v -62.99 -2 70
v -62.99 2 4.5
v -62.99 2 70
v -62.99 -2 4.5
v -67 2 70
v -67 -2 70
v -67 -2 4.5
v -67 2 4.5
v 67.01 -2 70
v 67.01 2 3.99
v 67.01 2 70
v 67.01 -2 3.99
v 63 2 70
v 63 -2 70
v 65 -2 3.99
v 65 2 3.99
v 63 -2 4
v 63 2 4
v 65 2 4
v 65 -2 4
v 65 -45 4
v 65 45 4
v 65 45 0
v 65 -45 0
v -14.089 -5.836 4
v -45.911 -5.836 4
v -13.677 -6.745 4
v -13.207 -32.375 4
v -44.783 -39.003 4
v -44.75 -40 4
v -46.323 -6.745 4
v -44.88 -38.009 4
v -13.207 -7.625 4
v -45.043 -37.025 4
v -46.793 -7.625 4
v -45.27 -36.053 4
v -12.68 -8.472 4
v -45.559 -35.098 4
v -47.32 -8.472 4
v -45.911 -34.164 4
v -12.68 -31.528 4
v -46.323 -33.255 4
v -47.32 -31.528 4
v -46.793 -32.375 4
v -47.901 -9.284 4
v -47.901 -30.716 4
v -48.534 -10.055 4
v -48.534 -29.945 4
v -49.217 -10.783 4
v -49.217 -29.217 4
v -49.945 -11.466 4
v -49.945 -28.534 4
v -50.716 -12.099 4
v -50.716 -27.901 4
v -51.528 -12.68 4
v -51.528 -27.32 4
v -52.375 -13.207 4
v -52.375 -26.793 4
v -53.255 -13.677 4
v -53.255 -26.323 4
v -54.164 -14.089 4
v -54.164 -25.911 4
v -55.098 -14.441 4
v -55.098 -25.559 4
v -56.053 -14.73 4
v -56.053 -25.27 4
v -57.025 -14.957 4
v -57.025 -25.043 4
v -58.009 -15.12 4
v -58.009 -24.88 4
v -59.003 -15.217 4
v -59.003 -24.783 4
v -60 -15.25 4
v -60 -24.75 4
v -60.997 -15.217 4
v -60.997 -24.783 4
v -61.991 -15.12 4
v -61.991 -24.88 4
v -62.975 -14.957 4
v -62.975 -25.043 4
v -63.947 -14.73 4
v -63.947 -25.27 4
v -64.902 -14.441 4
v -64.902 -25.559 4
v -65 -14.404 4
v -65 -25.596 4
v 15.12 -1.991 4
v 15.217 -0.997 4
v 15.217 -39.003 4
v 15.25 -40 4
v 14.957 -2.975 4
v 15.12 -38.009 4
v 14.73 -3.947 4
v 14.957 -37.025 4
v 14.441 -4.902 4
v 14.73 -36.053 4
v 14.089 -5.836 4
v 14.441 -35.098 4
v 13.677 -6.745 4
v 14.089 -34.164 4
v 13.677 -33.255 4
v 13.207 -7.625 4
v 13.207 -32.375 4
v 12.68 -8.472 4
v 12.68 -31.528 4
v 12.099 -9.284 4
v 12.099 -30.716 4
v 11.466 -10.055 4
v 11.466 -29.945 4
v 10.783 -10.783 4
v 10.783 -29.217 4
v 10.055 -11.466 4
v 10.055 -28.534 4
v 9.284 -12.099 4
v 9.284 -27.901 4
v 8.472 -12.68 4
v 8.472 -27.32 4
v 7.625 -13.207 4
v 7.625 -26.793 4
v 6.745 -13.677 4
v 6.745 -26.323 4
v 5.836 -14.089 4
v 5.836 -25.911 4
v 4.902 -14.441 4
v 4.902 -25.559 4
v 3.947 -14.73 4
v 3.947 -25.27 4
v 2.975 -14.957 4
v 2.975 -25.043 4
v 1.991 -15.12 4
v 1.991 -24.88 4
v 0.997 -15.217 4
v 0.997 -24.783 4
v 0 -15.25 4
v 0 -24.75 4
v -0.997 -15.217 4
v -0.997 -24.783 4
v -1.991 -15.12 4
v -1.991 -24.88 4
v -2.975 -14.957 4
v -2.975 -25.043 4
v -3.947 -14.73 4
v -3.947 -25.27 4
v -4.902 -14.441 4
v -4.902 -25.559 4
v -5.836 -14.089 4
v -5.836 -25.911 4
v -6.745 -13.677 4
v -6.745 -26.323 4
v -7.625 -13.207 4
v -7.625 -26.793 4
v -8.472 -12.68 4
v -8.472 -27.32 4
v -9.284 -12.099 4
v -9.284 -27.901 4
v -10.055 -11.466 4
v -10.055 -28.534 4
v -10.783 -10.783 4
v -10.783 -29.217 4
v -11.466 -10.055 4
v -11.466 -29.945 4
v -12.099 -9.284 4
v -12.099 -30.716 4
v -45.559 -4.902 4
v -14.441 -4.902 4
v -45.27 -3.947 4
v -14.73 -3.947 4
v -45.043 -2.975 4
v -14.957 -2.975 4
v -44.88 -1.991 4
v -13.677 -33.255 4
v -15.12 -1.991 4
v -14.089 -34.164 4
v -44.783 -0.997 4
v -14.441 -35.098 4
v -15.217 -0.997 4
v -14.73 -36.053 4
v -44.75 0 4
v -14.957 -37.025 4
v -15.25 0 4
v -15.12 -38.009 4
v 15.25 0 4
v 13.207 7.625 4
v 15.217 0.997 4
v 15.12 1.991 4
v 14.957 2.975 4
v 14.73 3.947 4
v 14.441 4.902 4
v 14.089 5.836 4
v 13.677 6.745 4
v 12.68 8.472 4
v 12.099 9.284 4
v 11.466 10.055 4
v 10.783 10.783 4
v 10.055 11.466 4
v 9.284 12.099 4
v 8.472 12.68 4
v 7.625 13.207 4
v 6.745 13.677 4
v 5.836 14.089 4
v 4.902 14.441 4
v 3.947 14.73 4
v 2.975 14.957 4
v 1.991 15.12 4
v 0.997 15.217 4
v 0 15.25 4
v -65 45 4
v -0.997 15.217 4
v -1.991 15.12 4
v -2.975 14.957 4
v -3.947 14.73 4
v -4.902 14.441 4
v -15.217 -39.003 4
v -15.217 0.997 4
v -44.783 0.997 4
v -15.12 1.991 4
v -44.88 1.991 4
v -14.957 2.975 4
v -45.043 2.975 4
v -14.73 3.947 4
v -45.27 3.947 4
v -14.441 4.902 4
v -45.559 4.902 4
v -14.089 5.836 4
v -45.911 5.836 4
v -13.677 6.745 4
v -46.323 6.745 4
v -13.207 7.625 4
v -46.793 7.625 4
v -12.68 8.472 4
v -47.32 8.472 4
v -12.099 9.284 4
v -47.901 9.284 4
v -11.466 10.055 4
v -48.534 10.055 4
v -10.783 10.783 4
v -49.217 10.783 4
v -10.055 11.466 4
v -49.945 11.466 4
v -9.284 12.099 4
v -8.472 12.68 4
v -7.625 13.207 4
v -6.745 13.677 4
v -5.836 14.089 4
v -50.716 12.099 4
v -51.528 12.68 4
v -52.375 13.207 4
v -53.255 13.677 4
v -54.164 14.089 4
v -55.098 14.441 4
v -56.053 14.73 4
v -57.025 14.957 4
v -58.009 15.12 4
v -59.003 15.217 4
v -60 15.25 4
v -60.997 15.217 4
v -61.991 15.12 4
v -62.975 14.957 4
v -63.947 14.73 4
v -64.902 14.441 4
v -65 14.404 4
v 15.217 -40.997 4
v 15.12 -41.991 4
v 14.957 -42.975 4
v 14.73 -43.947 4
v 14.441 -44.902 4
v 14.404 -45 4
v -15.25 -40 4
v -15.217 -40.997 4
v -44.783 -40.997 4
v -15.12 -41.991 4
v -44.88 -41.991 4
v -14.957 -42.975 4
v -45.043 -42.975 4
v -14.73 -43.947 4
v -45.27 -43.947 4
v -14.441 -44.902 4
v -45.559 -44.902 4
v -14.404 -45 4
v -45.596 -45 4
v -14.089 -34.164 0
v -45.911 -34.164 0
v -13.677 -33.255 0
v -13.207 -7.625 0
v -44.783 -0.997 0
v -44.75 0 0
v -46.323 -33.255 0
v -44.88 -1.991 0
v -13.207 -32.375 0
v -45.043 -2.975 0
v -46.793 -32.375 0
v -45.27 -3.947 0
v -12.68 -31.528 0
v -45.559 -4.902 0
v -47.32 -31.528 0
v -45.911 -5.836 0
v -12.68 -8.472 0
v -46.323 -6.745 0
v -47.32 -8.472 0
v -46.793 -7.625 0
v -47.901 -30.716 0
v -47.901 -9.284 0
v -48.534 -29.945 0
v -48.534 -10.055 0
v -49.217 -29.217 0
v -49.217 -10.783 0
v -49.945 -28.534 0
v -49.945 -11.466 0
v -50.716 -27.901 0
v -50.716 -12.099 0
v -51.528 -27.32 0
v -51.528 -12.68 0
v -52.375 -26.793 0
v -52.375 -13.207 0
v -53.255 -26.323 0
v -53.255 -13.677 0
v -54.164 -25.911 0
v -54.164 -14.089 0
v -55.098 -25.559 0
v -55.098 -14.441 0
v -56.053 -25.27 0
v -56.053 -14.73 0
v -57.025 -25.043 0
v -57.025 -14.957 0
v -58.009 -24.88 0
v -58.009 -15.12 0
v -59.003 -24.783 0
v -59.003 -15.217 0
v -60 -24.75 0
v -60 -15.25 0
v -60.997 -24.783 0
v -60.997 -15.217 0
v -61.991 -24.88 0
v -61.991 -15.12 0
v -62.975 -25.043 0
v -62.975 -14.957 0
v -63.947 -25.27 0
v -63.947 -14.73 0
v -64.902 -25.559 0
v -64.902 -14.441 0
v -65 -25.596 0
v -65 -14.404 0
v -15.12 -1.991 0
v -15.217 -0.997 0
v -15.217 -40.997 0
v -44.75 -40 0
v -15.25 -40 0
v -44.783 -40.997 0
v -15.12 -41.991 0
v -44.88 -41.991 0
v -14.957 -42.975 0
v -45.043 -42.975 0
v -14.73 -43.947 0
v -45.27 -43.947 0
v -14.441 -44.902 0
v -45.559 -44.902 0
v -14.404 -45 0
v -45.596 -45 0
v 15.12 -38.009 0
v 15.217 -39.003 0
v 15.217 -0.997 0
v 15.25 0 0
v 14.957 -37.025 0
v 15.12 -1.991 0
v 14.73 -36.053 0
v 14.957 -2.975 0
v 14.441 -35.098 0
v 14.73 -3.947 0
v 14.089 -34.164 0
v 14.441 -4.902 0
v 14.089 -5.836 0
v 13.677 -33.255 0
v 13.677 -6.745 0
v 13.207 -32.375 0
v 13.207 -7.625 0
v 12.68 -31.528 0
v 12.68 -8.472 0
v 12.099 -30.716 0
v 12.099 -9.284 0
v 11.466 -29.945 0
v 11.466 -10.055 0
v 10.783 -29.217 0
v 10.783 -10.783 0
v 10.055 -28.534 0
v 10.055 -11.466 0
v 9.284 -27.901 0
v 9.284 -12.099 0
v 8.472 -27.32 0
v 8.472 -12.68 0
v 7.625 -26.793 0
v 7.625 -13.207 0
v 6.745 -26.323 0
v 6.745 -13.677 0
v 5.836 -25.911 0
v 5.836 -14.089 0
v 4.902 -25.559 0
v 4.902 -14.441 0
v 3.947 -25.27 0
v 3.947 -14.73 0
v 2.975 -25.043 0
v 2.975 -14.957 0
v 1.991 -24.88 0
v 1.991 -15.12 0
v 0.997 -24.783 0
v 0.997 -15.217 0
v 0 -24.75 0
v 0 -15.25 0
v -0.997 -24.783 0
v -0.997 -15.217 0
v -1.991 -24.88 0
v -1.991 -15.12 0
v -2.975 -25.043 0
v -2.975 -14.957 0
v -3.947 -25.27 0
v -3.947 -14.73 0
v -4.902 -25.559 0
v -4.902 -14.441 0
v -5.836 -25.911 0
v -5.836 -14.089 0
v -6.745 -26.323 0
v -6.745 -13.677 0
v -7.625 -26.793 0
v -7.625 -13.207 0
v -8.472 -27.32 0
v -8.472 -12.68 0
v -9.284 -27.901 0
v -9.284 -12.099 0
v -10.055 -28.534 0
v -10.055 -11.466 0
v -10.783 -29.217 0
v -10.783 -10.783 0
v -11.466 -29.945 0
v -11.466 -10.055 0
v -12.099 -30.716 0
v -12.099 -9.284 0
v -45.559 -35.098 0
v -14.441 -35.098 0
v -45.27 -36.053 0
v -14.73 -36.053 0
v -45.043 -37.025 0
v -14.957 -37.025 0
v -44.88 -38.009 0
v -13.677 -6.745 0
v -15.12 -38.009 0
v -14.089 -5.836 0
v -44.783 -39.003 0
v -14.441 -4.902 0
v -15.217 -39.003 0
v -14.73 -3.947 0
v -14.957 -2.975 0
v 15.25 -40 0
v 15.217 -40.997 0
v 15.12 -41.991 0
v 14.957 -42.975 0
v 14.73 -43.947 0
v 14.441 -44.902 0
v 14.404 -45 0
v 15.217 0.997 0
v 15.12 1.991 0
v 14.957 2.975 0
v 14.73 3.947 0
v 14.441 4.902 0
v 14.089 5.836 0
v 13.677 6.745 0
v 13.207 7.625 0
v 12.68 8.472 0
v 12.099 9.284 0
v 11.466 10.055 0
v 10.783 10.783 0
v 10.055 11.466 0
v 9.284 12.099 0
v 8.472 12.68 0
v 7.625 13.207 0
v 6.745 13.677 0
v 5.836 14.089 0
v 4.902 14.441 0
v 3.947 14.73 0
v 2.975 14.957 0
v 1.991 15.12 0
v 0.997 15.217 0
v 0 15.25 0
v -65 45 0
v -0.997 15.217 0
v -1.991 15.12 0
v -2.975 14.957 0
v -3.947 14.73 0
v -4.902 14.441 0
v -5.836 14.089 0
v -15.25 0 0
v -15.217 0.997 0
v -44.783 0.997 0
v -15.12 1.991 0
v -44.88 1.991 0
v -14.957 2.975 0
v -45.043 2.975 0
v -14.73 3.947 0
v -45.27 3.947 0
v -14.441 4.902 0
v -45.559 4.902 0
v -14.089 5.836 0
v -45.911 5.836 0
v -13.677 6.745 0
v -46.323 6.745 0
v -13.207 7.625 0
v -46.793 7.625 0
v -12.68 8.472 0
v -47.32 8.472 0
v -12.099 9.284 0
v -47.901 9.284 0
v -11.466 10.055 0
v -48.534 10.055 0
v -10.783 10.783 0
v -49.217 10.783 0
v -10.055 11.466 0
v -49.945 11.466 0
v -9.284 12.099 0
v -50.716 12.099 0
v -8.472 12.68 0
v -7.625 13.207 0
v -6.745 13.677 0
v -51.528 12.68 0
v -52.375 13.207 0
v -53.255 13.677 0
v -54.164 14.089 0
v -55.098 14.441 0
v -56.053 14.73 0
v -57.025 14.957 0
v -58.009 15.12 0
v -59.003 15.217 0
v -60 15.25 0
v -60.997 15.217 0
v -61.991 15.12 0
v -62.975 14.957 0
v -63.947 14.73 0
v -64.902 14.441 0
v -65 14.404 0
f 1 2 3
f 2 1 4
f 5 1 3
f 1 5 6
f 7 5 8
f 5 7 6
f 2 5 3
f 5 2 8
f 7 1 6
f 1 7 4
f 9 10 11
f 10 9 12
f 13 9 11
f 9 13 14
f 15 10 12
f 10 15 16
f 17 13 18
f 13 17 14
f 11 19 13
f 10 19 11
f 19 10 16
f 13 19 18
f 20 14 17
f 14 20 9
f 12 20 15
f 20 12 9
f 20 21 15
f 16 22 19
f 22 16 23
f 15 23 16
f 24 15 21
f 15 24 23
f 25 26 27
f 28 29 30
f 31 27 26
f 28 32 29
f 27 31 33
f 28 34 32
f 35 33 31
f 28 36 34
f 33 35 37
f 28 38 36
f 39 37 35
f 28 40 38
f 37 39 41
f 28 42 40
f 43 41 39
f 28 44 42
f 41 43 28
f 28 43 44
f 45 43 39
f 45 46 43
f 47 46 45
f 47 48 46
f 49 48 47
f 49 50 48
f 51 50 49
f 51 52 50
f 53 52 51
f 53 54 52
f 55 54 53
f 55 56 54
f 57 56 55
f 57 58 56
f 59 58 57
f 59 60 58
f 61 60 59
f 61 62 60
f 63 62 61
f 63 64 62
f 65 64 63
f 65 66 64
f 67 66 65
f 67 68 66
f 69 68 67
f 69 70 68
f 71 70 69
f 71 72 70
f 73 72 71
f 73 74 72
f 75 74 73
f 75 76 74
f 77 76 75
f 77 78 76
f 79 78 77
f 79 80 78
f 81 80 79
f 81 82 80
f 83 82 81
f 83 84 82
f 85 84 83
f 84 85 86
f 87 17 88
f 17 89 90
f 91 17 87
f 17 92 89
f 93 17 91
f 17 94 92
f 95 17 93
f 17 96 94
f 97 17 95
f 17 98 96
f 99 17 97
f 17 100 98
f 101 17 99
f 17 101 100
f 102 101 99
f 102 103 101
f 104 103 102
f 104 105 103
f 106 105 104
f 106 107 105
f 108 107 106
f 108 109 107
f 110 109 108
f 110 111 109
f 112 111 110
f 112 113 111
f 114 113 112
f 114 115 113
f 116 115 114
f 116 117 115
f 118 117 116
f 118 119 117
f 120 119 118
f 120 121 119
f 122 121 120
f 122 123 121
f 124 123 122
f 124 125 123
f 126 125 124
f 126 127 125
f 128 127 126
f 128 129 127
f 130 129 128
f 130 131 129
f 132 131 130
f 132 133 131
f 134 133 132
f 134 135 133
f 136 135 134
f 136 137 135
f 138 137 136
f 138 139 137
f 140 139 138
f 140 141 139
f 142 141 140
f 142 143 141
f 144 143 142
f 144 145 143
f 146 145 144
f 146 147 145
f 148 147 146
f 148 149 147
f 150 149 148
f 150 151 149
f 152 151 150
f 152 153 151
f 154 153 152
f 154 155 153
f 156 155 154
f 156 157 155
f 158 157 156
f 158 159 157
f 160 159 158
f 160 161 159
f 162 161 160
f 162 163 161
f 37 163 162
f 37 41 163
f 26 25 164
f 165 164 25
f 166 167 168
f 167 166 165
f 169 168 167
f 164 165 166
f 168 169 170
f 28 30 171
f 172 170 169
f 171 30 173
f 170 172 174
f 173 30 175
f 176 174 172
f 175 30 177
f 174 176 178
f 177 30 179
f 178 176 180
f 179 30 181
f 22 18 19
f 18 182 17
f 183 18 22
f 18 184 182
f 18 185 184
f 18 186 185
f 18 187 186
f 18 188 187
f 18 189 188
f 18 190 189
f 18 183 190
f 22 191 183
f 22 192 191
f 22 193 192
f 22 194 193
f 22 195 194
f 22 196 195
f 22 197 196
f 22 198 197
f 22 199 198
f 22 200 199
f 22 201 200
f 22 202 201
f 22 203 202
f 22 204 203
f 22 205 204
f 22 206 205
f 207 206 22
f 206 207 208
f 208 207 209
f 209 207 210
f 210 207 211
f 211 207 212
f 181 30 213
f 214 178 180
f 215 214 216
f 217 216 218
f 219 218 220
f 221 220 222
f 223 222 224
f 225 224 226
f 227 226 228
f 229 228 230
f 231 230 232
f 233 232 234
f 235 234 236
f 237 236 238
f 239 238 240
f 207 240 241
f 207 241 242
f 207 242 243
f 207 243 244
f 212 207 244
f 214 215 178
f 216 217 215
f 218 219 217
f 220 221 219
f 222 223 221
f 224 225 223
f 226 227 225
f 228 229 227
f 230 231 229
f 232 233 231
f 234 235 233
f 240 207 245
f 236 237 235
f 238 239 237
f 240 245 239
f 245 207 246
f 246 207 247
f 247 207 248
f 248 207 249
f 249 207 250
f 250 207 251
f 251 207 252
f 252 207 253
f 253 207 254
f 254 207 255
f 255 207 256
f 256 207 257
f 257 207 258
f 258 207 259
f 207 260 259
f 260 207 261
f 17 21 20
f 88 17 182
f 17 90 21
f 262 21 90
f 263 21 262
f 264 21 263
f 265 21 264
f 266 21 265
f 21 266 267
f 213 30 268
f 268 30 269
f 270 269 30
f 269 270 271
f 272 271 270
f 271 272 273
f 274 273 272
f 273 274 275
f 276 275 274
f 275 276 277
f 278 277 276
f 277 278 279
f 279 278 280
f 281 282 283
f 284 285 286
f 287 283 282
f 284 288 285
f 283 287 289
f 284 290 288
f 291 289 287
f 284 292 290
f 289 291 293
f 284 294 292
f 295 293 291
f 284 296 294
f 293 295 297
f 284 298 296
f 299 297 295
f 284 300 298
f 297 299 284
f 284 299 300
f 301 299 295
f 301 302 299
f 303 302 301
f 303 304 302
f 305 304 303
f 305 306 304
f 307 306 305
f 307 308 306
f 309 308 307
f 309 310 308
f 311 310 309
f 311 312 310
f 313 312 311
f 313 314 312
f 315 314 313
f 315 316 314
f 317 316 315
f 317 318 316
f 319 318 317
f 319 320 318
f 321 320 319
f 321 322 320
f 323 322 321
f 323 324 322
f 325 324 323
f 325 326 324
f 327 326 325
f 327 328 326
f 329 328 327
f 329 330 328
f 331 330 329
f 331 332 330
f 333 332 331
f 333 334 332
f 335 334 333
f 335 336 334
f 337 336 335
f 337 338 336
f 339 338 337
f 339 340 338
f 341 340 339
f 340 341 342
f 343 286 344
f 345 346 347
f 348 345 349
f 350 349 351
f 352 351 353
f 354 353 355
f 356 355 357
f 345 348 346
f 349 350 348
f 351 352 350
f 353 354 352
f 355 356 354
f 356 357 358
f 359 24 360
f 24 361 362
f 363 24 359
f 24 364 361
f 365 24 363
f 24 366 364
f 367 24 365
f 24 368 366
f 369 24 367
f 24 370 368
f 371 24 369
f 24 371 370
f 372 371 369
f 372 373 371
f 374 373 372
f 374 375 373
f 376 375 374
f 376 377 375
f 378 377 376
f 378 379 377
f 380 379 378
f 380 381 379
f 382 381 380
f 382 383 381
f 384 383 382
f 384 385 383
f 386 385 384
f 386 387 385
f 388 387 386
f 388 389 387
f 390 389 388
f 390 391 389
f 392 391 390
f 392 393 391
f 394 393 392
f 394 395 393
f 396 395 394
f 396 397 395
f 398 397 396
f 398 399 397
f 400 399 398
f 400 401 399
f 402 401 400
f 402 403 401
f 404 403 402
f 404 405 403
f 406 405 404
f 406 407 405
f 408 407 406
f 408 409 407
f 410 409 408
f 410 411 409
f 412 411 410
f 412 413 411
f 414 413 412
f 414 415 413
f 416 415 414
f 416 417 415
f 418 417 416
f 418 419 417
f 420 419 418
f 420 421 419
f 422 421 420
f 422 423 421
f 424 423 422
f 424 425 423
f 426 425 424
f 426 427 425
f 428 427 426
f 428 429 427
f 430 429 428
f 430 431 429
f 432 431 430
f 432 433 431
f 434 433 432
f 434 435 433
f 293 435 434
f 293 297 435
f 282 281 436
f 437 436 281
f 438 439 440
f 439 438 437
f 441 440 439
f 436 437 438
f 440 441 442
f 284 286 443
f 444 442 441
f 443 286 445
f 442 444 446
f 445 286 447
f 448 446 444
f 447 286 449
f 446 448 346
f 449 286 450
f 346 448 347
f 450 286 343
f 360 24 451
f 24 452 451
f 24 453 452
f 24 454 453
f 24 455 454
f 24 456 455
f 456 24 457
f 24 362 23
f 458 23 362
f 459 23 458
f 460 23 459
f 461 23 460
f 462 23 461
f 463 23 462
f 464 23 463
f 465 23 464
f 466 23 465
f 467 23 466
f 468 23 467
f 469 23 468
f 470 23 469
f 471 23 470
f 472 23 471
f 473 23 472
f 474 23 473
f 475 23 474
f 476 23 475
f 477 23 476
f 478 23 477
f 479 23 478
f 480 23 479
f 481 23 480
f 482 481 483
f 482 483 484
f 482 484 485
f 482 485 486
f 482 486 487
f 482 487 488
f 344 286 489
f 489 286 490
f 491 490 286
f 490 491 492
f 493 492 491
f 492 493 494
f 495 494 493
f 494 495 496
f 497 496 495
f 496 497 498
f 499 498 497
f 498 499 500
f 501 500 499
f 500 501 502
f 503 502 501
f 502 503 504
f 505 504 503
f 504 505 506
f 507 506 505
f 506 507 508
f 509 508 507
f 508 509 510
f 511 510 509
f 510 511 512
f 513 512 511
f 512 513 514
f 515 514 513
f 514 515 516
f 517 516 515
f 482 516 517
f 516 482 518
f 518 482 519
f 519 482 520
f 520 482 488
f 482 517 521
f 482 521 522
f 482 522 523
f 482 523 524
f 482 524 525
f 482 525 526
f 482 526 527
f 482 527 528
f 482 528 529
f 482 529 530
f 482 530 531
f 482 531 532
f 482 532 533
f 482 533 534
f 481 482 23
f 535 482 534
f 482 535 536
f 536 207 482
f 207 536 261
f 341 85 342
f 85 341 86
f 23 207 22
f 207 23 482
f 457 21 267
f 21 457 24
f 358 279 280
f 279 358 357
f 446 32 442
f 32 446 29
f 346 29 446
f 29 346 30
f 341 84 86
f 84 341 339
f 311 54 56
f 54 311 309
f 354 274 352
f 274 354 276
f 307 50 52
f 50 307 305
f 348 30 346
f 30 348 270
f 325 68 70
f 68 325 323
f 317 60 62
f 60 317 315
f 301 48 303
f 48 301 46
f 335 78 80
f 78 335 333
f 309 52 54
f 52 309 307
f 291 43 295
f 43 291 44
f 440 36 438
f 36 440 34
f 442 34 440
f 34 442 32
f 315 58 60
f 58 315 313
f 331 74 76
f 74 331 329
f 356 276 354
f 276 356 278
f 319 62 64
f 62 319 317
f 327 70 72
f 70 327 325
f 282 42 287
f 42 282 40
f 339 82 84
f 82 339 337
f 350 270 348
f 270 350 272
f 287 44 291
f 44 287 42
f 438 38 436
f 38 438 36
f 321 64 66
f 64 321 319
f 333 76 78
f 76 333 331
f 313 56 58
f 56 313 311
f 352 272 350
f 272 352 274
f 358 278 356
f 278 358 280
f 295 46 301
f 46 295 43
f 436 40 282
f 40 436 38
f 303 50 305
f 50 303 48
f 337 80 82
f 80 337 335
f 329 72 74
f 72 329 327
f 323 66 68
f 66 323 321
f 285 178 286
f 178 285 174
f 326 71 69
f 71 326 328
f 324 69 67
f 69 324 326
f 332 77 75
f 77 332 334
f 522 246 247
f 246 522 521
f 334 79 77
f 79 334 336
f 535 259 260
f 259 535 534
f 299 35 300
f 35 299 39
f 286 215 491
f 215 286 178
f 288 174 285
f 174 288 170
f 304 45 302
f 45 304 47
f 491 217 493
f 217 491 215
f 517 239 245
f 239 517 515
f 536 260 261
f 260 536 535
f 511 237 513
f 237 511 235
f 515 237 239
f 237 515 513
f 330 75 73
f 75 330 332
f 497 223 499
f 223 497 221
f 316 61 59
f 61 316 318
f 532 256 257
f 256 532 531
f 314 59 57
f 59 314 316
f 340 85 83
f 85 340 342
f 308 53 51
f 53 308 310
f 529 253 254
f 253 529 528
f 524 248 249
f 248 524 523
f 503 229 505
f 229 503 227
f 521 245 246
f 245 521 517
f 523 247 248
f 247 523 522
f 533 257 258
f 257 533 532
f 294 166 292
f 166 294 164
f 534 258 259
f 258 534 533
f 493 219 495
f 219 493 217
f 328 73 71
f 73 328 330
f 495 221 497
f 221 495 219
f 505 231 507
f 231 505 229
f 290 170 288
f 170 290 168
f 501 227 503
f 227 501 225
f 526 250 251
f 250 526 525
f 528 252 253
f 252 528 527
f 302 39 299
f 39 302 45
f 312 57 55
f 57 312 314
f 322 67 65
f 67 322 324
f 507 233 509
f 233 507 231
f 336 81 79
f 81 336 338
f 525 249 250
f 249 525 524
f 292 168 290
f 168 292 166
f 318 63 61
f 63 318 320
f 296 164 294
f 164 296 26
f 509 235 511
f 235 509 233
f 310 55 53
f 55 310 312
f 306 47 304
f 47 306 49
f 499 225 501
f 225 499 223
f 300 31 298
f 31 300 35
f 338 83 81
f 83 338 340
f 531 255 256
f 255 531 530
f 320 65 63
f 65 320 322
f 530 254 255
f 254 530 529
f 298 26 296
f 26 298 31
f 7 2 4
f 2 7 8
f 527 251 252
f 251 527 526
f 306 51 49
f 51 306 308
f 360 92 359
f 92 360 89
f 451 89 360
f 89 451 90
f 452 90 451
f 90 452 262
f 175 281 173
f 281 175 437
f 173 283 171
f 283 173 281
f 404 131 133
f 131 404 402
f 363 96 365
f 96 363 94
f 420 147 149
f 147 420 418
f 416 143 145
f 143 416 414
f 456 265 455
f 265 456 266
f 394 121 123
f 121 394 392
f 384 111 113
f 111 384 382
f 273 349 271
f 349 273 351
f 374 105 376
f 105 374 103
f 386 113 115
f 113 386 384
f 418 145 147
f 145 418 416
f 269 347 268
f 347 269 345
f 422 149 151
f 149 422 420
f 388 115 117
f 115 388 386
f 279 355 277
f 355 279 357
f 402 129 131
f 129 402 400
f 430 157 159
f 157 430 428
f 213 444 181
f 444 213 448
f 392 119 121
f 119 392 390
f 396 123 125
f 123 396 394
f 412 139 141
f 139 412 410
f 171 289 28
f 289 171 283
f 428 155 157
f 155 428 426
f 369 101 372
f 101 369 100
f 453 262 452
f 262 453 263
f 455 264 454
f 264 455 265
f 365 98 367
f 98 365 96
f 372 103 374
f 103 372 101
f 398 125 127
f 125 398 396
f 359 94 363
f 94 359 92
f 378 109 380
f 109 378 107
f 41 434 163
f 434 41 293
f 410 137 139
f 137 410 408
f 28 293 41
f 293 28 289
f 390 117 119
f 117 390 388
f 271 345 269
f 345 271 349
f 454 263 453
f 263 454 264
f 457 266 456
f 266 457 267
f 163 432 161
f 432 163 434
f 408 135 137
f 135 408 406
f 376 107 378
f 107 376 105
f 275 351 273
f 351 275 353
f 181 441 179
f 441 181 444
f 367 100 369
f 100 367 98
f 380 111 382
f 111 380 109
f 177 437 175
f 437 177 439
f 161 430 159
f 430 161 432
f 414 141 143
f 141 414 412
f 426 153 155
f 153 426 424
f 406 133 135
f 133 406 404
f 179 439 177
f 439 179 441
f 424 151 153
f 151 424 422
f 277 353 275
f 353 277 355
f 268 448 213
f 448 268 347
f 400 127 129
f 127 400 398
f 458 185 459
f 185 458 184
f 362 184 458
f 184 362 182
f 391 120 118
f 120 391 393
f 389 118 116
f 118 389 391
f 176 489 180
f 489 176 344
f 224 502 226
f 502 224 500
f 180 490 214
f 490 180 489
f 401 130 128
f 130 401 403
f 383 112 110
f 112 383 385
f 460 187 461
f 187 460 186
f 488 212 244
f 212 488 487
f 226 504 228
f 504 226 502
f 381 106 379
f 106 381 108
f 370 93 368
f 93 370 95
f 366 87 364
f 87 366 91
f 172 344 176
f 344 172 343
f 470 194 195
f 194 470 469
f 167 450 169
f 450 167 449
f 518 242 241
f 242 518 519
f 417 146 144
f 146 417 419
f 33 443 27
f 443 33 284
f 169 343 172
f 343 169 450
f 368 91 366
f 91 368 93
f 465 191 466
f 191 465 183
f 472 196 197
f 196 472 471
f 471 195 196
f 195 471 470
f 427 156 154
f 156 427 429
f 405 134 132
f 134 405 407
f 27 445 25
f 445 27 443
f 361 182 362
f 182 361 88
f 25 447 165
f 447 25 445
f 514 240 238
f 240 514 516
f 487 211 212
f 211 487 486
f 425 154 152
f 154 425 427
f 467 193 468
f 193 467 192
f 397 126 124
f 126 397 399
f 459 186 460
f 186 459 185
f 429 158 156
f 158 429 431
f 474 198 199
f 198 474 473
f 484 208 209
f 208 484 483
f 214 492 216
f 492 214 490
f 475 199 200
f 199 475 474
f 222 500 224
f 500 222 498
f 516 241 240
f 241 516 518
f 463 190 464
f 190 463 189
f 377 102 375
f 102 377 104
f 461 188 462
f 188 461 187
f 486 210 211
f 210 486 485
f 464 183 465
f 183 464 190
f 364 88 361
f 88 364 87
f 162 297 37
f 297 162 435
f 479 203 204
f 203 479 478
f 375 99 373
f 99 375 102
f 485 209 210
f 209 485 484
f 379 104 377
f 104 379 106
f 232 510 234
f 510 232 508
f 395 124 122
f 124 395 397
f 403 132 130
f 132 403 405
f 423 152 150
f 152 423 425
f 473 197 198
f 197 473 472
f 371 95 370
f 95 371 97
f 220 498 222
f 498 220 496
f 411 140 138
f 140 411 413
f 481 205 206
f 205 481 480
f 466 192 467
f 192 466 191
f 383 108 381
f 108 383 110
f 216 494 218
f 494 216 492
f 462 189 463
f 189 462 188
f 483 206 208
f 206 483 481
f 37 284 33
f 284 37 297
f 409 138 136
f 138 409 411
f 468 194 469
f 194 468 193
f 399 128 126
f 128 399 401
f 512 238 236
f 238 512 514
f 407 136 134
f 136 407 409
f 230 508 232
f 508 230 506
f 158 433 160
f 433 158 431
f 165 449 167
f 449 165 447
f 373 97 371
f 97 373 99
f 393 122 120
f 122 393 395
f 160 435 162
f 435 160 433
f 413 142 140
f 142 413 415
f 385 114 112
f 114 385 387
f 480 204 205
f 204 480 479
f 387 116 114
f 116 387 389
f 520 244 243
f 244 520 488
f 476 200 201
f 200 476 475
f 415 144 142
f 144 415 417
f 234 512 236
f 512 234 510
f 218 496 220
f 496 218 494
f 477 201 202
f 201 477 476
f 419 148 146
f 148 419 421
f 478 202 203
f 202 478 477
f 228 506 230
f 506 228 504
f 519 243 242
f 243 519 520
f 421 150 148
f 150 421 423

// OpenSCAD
// Rack for six 50 mL conical (Falcon-type) tubes
// Print orientation: flat plate on the bed, walls pointing up (+Z).
// After printing, flip the part over so it stands on the two walls.

// ---------------- Parameters ----------------
plate_x      = 130;   // plate length along X (mm)
plate_y      = 90;    // plate width along Y (mm)
plate_t      = 4;     // plate thickness (mm), z = 0..4

hole_d       = 30.5;  // tube hole diameter (mm)
hole_nx      = 3;     // number of holes along X
hole_ny      = 2;     // number of holes along Y
hole_pitch   = 40;    // centre-to-centre spacing along X and Y (mm)

wall_t       = 4;     // wall thickness along Y (mm)
wall_h       = 66;    // wall height above plate top (z = 4..70) (mm)

eps          = 0.5;   // cutter overshoot past faces (mm)
$fn          = 96;    // curve resolution

// ---------------- Model ----------------
difference() {
    union() {
        // Base plate
        translate([-plate_x/2, -plate_y/2, 0])
            cube([plate_x, plate_y, plate_t]);

        // Two solid walls along the long edges (X = +/-65)
        for (sx = [-1, 1])
            translate([sx * plate_x/2 - wall_t/2, -wall_t/2, plate_t - 0.01])
                cube([wall_t + 0.01, wall_t, wall_h + 0.01]);
    }

    // Tube holes through the plate
    for (i = [-hole_nx/2 : hole_nx/2 : hole_nx/2 - 1])
        for (j = [-hole_ny/2 : hole_ny/2 : hole_ny/2 - 1])
            translate([i * hole_pitch, j * hole_pitch, -eps])
                cylinder(d = hole_d, h = plate_t + 2 * eps);
}
